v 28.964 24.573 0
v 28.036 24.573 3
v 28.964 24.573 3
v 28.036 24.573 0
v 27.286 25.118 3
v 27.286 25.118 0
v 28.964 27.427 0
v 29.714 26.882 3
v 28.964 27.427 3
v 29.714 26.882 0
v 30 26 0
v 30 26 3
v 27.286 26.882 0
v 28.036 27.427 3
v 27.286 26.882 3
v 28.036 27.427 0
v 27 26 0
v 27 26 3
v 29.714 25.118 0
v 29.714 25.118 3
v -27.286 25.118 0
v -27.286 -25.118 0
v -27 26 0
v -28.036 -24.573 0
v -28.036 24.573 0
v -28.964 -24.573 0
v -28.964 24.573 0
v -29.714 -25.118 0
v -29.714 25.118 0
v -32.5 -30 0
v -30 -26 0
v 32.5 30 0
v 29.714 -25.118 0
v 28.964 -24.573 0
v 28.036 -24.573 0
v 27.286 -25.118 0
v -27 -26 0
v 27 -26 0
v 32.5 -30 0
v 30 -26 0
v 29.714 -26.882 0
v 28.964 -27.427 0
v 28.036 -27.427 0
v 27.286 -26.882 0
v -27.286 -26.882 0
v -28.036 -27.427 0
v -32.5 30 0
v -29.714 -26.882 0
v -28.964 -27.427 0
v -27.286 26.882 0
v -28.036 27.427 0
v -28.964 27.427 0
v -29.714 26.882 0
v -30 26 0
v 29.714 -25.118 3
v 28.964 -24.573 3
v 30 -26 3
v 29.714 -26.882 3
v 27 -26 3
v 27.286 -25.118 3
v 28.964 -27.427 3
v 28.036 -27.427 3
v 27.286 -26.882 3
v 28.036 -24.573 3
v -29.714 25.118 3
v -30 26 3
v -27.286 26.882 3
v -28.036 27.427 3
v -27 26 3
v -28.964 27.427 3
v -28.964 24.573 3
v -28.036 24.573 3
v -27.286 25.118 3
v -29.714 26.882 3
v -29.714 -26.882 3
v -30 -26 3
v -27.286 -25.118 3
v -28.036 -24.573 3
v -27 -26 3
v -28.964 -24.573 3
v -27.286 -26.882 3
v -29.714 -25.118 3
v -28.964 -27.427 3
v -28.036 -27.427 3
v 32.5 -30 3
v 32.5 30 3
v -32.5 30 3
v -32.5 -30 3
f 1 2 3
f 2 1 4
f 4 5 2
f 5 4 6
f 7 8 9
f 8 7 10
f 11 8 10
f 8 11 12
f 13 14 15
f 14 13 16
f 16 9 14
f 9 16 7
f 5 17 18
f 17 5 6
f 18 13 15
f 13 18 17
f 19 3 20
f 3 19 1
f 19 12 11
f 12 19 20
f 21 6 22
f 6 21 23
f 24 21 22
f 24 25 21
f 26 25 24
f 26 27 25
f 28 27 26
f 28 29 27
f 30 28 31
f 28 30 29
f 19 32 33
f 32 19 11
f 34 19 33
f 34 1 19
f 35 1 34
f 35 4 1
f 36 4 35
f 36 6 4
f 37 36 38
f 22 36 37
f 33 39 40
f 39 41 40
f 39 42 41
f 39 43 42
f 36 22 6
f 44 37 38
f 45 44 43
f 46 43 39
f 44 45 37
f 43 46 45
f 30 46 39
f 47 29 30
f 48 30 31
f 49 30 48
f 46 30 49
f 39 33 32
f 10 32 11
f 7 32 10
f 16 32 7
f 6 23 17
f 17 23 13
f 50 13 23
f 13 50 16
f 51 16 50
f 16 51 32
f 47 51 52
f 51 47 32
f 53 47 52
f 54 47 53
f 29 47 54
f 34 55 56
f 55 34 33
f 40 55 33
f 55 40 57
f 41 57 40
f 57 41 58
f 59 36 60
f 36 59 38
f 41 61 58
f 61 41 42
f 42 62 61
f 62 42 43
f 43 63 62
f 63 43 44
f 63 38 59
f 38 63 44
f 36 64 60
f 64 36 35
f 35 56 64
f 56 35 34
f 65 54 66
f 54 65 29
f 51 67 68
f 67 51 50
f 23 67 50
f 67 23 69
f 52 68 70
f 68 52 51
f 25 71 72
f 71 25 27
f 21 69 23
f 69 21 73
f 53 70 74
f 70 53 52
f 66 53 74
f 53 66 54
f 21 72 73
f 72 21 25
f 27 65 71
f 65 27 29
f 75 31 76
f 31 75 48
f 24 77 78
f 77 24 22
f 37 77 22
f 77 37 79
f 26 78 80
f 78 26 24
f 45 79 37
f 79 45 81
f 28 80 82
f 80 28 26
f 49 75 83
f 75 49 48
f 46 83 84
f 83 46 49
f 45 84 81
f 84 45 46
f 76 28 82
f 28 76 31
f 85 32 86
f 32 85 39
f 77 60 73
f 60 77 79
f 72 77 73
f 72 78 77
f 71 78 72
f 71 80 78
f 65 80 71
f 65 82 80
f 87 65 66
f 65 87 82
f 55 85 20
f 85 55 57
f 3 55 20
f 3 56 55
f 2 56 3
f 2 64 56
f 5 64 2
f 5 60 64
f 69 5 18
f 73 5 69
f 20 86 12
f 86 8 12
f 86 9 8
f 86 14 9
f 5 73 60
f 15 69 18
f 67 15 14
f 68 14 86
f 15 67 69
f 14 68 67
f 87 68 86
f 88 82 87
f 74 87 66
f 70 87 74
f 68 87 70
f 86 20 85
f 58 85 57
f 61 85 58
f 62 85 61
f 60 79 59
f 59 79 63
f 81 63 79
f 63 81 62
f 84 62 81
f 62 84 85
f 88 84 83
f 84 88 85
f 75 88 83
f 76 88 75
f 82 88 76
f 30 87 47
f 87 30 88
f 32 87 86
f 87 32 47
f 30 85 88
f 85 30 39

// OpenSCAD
// file: connectors.scad
use <util.scad>

module smaFemale(threadedL, totalL){
    cylinder(threadedL, 6.3/2, 6.3/2);
    cylinder(totalL, 4.8/2, 4.8/2);
}


module tncFemale(threadedL, totalL){
    cylinder(threadedL, 11/2, 11/2);
    cylinder(totalL, 9.8/2, 9.8/2);
}

module nFemale(neckL, totalL){
    xr(180) zt(-totalL){
        cylinder(8.5, 14.2/2, 14.2/2);
        zt(1.6) cylinder(4.5, 15.8/2, 15.8/2);
        //cylinder(threadedL, 11/2, 11/2);
        cylinder(totalL, 9.8/2, 9.8/2);
        zt(8.5) cylinder(totalL-8.5, 16/2, 16/2);
    }
}

module nMale(){
    cylinder(17, 19.5/2, 19.5/2);
    zt(4.5) cylinder(10.5, 20.2/2, 20.2/2);
}

module bananaFemale(){
    cylinder(4,6,6);
    zt(-28)cylinder(28,4,4);
    zt(-1) hull() {
        cylinder(1,1,1);
        xt(5)cylinder(1,1,1,$fn=10);
    }
}

module smaMale(){
    r=8/cos(360/12)/2;
    cylinder(8.3, 7.8/2, 7.8/2);
    cylinder(6, r, r, $fn=6);
}

smaMale();
//bananaFemale();
//nFemale(11,19);
// file: util.scad
module centerCube(v){
    translate([-v[0]/2,-v[1]/2,0]) cube(v);
}

module nObj(r, n, offs){
    for(a=[1:n]) rotate([0,0, offs+a*360/n]) translate([r,0,0]) children();
}

module quad(d){
    nObj(sqrt(2)*d, 4, 45) children();
}

module quad2(x,y){
    translate([x,y,0]) children();
    translate([x,-y,0]) children();
    translate([-x,y,0]) children();
    translate([-x,-y,0]) children();
}

module zt(z){
    translate([0,0,z]) children();
}

module xt(x){
    translate([x,0,0]) children();
}

module yt(y){
    translate([0,y,0]) children();
}

module zr(z){
    rotate([0,0,z]) children();
}

module xr(x){
    rotate([x,0,0]) children();
}

module yr(y){
    rotate([0,y,0]) children();
}
// main file
use <util.scad>
use <connectors.scad>
body=[38.2,38.2, 19.2];
smaHeight=13;
smaL=6.2;
smaThread=6.2;
smaSep=12.8;
pinL=7.5;
pinR=0.3;
pinHeight=4;
pinSep=4.5;
testBoxBodyDim=[65,60,20];
testBoxWt=1.5;
testBoxTt=4;
cableHoleR=3;
cornerScrewOffset=4;
testBoxLidT=3;


module Sp4tSolidStateBody(){
    centerCube(body);
    translate([0,body[0]/2+smaL, smaHeight]) rotate([90,0,0])smaFemale(smaThread,smaL);
    translate([0,-body[0]/2-smaL, smaHeight]) rotate([-90,0,0])smaFemale(smaThread,smaL);
    translate([-body[0]/2-smaL, smaSep/2, smaHeight]) rotate([0,90,0])smaFemale(smaThread,smaL);
    translate([-body[0]/2-smaL, -smaSep/2, smaHeight]) rotate([0,90,0])smaFemale(smaThread,smaL);
    translate([body[0]/2+smaL, smaSep/2, smaHeight]) rotate([0,-90,0])smaFemale(smaThread,smaL);

    translate([0,-body[0]/2, pinHeight]) rotate([90,0,0]) cylinder(pinL,pinR,pinR);
    translate([-1*pinSep,-body[0]/2, pinHeight]) rotate([90,0,0]) cylinder(pinL,pinR,pinR);
    translate([-2*pinSep,-body[0]/2, pinHeight]) rotate([90,0,0]) cylinder(pinL,pinR,pinR);
    translate([-3*pinSep,-body[0]/2, pinHeight]) rotate([90,0,0]) cylinder(pinL,pinR,pinR);

    translate([3*pinSep,-body[0]/2, pinHeight]) rotate([90,0,0]) cylinder(pinL,pinR,pinR);
    translate([3*pinSep,-body[0]/2, pinHeight+pinSep]) rotate([90,0,0]) cylinder(pinL,pinR,pinR);
    translate([3*pinSep,-body[0]/2, pinHeight+2*pinSep]) rotate([90,0,0]) cylinder(5,1,1);
}

module placeSp4tSolidStateHolePattern(){
    quad(32.8/2) children();
}

module sp4tSolidStateHolePattern(l=20, r=1.5){
    placeSp4tSolidStateHolePattern() cylinder(l, r,r);
}

module Sp4tSolidState(){
    difference(){
        Sp4tSolidStateBody();
        sp4tSolidStateHolePattern();
    }
}

module placeTestBoxLidHoles(){
    quad2((testBoxBodyDim[0])/2-cornerScrewOffset,(testBoxBodyDim[1])/2-cornerScrewOffset) children();
}


module testBoxBody(){
    difference(){
        centerCube(testBoxBodyDim);
        centerCube(testBoxBodyDim-[2*testBoxWt,2*testBoxWt,testBoxTt]);
        zt(testBoxBodyDim[2]-testBoxTt-1)sp4tSolidStateHolePattern(l=testBoxTt+2, r=1.5);
    }
    placeTestBoxLidHoles() cylinder(10,cornerScrewOffset,cornerScrewOffset);
}

module testBoxLid(){
    difference(){
        centerCube([testBoxBodyDim[0], testBoxBodyDim[1], testBoxLidT]);
        placeTestBoxLidHoles() cylinder(10,1.5,1.5, $fn=10);
    }
}


module testBox(){
    difference(){
        testBoxBody();
        placeBananas() bananaFemale();
        placeSwitches() cylinder(10,3,3);
        placeCableHoles() cylinder(30,cableHoleR,cableHoleR);
        placeTestBoxLidHoles() cylinder(15, 1.5,1.5);
    }
}

module placeBananas(){
    zt((testBoxBodyDim[2]-testBoxTt)/2){
        yt(-testBoxBodyDim[1]/2)xr(90) children();
        xt(-19.05)yt(-testBoxBodyDim[1]/2)xr(90) children();
        xt(19.05)yt(-testBoxBodyDim[1]/2)xr(90) children();
    }
}

module placeSwitches(){
    zt((testBoxBodyDim[2]-testBoxTt)/2){
        //            yt(testBoxBodyDim[1]/2+2) xr(90) children();
        xt(-13/2)  yt(testBoxBodyDim[1]/2+2) xr(90) children();
        xt(13/2)   yt(testBoxBodyDim[1]/2+2) xr(90) children();
        xt(-13/2-13)  yt(testBoxBodyDim[1]/2+2) xr(90) children();
        xt(13/2+13)   yt(testBoxBodyDim[1]/2+2) xr(90) children();
    }
}

module assembly(){
    zt(20)Sp4tSolidState();
    testBox();
    placeBananas() bananaFemale();
    placeSwitches() cylinder(10,3,3);
    zt(-5)testBoxLid();
}

module placeCableHoles(){
    zt((testBoxBodyDim[2]-testBoxTt)-cableHoleR){
        xt(-testBoxBodyDim[0]/2+testBoxWt+cableHoleR)yt(-10)xr(90) children();
        xt(testBoxBodyDim[0]/2-testBoxWt-cableHoleR)yt(-10)xr(90) children();
    }
}


//testBox();
testBoxLid();
//assembly();
